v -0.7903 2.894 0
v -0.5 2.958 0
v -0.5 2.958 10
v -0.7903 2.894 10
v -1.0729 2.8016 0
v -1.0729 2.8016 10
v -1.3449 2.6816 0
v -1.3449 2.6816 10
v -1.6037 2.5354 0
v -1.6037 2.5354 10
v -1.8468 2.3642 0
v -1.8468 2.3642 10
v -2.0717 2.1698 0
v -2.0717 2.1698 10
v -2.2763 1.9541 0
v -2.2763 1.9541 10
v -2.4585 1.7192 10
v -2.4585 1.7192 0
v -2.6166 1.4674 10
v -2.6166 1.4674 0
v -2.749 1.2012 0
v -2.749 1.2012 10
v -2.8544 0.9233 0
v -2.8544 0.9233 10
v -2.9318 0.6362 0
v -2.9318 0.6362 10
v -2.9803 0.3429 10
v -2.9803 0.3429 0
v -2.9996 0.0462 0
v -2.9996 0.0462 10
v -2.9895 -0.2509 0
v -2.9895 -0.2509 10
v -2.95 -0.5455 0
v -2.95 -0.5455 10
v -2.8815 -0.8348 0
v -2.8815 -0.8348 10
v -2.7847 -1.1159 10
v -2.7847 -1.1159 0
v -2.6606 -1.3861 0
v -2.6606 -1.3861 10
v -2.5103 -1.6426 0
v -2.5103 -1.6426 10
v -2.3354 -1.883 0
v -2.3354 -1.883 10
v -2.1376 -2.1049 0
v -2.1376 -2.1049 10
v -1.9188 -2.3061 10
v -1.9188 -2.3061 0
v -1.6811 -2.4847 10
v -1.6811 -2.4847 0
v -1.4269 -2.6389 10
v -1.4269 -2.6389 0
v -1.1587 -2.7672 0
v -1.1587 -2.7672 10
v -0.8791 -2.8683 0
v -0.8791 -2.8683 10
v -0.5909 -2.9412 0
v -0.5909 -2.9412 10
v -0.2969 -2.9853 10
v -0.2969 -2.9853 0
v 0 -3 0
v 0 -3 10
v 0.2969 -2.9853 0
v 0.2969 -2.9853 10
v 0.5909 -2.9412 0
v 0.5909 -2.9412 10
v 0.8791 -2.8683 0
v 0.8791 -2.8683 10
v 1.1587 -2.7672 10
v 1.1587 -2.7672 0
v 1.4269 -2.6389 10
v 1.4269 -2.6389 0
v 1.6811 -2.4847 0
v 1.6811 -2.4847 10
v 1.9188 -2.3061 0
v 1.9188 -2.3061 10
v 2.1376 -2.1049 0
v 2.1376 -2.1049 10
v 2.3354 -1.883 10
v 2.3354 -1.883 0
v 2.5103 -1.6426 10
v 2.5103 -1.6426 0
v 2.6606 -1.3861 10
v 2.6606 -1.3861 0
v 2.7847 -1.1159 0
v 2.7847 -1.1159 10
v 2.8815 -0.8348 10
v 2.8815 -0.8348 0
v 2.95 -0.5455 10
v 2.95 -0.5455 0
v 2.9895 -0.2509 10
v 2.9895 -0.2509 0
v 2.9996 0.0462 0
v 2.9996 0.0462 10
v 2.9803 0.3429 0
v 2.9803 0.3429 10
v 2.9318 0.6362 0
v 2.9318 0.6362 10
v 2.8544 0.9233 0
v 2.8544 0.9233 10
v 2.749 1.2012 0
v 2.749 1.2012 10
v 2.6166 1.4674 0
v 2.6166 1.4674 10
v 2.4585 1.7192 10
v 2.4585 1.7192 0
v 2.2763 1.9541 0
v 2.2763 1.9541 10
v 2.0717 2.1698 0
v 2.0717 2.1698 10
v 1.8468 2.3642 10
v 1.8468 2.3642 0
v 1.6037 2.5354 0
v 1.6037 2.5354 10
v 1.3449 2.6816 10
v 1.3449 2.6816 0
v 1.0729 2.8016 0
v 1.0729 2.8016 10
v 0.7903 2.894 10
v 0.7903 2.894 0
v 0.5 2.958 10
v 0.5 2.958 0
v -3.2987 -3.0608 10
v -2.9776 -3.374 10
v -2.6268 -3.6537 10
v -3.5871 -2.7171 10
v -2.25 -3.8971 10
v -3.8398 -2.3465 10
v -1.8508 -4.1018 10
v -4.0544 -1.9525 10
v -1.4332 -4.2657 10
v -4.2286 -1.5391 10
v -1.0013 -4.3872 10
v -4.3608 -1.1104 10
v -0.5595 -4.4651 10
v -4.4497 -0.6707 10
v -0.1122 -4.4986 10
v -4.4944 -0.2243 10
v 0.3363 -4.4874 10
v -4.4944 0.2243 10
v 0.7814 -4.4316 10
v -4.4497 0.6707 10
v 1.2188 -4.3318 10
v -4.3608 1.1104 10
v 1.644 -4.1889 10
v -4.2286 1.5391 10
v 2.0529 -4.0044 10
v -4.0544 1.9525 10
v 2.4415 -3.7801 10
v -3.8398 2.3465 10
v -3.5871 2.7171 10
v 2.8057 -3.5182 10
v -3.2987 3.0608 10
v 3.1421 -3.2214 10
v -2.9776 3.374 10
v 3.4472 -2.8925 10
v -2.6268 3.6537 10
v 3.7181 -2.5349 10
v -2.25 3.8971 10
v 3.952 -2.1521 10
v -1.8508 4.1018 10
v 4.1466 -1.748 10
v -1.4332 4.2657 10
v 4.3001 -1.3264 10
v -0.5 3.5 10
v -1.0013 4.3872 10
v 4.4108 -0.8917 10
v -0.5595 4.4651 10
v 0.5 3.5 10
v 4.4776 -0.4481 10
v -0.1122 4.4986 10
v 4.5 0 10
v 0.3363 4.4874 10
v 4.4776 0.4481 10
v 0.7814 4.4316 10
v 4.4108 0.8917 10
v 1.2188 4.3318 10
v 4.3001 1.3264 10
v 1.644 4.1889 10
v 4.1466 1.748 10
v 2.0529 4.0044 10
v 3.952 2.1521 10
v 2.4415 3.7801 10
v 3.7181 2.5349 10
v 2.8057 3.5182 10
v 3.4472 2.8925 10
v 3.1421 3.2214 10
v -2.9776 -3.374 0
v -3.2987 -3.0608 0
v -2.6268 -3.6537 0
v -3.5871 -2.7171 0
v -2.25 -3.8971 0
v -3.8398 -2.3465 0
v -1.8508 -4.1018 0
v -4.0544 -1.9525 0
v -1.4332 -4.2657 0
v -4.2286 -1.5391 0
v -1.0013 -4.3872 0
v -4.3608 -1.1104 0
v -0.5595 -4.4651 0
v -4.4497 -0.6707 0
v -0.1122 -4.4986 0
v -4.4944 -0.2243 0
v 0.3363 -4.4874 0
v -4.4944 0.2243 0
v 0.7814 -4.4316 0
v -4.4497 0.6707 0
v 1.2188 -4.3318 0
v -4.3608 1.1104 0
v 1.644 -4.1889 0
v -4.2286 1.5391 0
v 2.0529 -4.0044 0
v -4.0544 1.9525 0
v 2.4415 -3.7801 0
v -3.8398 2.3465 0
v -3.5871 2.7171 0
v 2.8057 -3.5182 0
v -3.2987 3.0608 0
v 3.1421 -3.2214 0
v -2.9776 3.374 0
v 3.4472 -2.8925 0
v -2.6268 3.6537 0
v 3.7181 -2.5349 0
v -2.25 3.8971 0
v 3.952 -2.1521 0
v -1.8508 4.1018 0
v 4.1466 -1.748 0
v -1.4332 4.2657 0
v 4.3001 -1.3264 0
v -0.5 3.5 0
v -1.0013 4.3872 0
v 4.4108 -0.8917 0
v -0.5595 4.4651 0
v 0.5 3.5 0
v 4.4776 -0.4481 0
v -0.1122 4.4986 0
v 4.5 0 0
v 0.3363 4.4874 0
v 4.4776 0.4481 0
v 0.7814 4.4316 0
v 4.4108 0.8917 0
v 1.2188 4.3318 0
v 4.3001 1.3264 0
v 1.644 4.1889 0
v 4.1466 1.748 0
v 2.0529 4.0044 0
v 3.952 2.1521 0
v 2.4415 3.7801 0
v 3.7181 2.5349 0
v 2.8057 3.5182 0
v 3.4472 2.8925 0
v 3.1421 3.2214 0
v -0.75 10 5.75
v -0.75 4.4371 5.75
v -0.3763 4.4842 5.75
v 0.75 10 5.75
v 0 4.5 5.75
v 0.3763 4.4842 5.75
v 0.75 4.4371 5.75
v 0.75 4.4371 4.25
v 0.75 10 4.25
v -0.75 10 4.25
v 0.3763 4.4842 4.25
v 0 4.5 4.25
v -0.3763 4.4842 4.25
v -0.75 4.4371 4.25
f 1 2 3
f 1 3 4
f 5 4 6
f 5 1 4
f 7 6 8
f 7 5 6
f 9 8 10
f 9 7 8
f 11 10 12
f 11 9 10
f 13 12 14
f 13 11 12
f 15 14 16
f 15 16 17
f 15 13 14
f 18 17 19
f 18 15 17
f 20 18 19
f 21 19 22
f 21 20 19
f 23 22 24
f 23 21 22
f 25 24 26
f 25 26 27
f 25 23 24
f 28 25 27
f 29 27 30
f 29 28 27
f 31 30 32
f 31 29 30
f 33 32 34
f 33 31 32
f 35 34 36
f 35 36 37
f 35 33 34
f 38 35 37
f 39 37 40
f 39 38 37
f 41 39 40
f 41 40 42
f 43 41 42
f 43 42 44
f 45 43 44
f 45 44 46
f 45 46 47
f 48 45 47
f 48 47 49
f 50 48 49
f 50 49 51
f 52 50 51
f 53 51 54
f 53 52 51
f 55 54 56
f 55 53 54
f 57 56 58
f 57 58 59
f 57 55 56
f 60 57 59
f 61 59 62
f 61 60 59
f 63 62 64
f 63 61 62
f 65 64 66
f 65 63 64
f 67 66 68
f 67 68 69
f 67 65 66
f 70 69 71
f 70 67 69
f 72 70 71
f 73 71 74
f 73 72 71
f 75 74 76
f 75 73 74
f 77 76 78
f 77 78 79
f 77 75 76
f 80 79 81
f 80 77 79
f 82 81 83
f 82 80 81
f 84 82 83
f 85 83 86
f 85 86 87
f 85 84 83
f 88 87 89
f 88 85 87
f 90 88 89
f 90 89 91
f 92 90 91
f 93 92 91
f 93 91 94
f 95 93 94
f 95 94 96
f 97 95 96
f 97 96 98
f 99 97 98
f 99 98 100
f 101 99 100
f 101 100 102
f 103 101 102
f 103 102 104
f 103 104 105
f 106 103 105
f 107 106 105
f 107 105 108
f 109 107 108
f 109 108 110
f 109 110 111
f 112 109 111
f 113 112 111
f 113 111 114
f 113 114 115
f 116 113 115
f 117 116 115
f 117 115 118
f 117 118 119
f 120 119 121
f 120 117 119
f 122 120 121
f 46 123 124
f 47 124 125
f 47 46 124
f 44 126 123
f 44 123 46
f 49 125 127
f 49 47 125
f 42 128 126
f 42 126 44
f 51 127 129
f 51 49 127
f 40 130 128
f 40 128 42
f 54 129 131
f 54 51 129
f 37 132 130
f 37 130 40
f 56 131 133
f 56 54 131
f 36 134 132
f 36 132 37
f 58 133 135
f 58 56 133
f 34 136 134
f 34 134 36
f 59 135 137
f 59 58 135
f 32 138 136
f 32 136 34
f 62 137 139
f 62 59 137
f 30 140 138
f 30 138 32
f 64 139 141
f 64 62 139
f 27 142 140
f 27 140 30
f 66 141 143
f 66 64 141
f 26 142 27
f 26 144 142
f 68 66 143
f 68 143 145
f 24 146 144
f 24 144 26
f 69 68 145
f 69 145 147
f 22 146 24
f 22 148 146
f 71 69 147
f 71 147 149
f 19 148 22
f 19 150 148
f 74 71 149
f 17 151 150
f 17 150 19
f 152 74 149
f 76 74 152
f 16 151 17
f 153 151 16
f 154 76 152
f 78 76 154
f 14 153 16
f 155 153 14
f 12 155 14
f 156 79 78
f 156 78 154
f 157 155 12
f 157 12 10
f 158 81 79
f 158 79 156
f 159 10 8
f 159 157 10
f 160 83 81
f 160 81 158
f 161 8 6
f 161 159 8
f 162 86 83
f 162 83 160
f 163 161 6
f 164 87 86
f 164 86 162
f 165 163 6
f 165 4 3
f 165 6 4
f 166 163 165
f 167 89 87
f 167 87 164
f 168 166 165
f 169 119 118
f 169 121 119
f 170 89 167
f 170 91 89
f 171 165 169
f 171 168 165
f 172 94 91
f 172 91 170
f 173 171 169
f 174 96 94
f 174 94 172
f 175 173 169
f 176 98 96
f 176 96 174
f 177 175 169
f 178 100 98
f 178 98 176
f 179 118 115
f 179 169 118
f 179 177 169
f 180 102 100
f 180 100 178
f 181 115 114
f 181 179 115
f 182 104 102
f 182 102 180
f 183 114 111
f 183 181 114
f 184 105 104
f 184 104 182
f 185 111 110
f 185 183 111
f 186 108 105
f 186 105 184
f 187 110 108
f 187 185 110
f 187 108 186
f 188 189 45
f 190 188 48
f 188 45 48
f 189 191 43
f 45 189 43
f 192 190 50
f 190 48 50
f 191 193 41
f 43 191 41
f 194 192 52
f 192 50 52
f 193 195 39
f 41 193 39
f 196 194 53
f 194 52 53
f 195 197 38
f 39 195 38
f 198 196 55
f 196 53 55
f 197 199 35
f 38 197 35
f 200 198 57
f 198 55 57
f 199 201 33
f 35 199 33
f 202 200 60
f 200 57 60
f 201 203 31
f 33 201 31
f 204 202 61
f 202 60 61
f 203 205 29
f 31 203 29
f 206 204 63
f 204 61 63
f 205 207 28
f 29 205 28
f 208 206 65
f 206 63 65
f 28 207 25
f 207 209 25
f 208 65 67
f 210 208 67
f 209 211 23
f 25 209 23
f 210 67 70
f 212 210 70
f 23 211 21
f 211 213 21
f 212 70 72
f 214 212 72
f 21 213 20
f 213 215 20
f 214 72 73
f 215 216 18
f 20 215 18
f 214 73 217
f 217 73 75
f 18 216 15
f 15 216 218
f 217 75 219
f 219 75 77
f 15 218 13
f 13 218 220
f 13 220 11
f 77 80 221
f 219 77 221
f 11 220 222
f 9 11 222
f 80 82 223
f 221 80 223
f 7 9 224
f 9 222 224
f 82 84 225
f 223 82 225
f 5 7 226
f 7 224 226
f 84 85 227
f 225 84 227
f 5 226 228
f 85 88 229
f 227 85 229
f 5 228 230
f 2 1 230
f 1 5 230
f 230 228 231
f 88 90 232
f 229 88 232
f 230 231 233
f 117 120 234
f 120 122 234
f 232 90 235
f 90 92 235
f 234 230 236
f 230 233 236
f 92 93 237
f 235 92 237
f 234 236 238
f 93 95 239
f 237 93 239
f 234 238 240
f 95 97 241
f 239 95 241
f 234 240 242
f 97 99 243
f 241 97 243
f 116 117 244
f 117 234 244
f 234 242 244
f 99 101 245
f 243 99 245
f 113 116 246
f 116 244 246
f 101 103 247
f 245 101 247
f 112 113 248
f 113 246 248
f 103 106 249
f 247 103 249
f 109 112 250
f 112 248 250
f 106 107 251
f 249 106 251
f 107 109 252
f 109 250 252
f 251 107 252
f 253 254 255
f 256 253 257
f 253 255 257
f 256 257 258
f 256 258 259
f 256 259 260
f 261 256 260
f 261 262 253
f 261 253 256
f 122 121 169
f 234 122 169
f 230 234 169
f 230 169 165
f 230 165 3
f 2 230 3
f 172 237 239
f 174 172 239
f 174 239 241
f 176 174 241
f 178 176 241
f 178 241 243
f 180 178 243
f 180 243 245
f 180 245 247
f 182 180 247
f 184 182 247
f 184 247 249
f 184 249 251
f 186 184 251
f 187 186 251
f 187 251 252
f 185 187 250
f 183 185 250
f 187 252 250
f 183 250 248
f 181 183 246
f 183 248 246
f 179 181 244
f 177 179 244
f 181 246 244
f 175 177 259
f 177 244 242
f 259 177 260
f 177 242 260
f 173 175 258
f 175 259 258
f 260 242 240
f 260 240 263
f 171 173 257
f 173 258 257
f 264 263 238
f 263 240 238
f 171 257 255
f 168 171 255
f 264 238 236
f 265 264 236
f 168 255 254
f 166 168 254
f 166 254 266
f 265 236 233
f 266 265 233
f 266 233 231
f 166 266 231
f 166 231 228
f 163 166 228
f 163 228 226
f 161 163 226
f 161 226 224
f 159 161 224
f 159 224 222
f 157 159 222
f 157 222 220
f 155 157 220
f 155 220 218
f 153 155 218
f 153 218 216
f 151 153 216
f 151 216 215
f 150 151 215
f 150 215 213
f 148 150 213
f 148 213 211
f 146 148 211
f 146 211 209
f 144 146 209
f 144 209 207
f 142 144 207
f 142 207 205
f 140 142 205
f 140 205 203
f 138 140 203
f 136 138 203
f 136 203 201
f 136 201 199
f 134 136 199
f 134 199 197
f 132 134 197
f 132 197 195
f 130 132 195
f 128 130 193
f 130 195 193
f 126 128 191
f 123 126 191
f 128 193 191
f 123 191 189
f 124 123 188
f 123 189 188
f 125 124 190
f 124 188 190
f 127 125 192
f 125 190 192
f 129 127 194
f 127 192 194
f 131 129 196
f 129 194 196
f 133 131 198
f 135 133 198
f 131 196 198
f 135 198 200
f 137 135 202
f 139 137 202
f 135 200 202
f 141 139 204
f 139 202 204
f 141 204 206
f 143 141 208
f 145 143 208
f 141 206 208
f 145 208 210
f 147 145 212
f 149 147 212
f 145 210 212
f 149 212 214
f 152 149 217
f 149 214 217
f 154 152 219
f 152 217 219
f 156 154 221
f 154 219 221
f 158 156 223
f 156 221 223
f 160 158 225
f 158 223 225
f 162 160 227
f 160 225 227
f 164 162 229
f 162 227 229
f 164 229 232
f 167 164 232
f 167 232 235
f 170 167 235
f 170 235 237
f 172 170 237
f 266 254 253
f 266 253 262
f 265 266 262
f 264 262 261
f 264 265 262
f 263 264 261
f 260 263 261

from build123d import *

# Parameters (mm, degrees)
SKETCH1_R           = 4.5
BOSS_EXTRUDE1_DEPTH = 10
BOSS_EXTRUDE3_START = 4
SKETCH3_W           = 1.5
SKETCH3_H           = 1.5
BOSS_EXTRUDE3_DEPTH = 6


with BuildPart() as part:
    # Sketch1 → Boss-Extrude1 (new body)
    with BuildSketch(Plane.XY):
        Circle(SKETCH1_R)
        with BuildLine():
            Line((0.5, 2.958039892), (0.5, 3.5))
            Line((0.5, 3.5), (-0.5, 3.5))
            Line((-0.5, 3.5), (-0.5, 2.958039892))
            ThreePointArc((-0.5, 2.958039892), (0, -3), (0.5, 2.958039892))
        make_face(mode=Mode.SUBTRACT)
    extrude(amount=BOSS_EXTRUDE1_DEPTH)

    # Sketch3 → Boss-Extrude3 (add)
    with BuildSketch(Plane(origin=(0, 0, 0), x_dir=(1, 0, 0), z_dir=(0, 1, 0)).offset(BOSS_EXTRUDE3_START)):
        with Locations((0, -5)):
            Rectangle(SKETCH3_W, SKETCH3_H)
    extrude(amount=BOSS_EXTRUDE3_DEPTH)


solid = part.part
